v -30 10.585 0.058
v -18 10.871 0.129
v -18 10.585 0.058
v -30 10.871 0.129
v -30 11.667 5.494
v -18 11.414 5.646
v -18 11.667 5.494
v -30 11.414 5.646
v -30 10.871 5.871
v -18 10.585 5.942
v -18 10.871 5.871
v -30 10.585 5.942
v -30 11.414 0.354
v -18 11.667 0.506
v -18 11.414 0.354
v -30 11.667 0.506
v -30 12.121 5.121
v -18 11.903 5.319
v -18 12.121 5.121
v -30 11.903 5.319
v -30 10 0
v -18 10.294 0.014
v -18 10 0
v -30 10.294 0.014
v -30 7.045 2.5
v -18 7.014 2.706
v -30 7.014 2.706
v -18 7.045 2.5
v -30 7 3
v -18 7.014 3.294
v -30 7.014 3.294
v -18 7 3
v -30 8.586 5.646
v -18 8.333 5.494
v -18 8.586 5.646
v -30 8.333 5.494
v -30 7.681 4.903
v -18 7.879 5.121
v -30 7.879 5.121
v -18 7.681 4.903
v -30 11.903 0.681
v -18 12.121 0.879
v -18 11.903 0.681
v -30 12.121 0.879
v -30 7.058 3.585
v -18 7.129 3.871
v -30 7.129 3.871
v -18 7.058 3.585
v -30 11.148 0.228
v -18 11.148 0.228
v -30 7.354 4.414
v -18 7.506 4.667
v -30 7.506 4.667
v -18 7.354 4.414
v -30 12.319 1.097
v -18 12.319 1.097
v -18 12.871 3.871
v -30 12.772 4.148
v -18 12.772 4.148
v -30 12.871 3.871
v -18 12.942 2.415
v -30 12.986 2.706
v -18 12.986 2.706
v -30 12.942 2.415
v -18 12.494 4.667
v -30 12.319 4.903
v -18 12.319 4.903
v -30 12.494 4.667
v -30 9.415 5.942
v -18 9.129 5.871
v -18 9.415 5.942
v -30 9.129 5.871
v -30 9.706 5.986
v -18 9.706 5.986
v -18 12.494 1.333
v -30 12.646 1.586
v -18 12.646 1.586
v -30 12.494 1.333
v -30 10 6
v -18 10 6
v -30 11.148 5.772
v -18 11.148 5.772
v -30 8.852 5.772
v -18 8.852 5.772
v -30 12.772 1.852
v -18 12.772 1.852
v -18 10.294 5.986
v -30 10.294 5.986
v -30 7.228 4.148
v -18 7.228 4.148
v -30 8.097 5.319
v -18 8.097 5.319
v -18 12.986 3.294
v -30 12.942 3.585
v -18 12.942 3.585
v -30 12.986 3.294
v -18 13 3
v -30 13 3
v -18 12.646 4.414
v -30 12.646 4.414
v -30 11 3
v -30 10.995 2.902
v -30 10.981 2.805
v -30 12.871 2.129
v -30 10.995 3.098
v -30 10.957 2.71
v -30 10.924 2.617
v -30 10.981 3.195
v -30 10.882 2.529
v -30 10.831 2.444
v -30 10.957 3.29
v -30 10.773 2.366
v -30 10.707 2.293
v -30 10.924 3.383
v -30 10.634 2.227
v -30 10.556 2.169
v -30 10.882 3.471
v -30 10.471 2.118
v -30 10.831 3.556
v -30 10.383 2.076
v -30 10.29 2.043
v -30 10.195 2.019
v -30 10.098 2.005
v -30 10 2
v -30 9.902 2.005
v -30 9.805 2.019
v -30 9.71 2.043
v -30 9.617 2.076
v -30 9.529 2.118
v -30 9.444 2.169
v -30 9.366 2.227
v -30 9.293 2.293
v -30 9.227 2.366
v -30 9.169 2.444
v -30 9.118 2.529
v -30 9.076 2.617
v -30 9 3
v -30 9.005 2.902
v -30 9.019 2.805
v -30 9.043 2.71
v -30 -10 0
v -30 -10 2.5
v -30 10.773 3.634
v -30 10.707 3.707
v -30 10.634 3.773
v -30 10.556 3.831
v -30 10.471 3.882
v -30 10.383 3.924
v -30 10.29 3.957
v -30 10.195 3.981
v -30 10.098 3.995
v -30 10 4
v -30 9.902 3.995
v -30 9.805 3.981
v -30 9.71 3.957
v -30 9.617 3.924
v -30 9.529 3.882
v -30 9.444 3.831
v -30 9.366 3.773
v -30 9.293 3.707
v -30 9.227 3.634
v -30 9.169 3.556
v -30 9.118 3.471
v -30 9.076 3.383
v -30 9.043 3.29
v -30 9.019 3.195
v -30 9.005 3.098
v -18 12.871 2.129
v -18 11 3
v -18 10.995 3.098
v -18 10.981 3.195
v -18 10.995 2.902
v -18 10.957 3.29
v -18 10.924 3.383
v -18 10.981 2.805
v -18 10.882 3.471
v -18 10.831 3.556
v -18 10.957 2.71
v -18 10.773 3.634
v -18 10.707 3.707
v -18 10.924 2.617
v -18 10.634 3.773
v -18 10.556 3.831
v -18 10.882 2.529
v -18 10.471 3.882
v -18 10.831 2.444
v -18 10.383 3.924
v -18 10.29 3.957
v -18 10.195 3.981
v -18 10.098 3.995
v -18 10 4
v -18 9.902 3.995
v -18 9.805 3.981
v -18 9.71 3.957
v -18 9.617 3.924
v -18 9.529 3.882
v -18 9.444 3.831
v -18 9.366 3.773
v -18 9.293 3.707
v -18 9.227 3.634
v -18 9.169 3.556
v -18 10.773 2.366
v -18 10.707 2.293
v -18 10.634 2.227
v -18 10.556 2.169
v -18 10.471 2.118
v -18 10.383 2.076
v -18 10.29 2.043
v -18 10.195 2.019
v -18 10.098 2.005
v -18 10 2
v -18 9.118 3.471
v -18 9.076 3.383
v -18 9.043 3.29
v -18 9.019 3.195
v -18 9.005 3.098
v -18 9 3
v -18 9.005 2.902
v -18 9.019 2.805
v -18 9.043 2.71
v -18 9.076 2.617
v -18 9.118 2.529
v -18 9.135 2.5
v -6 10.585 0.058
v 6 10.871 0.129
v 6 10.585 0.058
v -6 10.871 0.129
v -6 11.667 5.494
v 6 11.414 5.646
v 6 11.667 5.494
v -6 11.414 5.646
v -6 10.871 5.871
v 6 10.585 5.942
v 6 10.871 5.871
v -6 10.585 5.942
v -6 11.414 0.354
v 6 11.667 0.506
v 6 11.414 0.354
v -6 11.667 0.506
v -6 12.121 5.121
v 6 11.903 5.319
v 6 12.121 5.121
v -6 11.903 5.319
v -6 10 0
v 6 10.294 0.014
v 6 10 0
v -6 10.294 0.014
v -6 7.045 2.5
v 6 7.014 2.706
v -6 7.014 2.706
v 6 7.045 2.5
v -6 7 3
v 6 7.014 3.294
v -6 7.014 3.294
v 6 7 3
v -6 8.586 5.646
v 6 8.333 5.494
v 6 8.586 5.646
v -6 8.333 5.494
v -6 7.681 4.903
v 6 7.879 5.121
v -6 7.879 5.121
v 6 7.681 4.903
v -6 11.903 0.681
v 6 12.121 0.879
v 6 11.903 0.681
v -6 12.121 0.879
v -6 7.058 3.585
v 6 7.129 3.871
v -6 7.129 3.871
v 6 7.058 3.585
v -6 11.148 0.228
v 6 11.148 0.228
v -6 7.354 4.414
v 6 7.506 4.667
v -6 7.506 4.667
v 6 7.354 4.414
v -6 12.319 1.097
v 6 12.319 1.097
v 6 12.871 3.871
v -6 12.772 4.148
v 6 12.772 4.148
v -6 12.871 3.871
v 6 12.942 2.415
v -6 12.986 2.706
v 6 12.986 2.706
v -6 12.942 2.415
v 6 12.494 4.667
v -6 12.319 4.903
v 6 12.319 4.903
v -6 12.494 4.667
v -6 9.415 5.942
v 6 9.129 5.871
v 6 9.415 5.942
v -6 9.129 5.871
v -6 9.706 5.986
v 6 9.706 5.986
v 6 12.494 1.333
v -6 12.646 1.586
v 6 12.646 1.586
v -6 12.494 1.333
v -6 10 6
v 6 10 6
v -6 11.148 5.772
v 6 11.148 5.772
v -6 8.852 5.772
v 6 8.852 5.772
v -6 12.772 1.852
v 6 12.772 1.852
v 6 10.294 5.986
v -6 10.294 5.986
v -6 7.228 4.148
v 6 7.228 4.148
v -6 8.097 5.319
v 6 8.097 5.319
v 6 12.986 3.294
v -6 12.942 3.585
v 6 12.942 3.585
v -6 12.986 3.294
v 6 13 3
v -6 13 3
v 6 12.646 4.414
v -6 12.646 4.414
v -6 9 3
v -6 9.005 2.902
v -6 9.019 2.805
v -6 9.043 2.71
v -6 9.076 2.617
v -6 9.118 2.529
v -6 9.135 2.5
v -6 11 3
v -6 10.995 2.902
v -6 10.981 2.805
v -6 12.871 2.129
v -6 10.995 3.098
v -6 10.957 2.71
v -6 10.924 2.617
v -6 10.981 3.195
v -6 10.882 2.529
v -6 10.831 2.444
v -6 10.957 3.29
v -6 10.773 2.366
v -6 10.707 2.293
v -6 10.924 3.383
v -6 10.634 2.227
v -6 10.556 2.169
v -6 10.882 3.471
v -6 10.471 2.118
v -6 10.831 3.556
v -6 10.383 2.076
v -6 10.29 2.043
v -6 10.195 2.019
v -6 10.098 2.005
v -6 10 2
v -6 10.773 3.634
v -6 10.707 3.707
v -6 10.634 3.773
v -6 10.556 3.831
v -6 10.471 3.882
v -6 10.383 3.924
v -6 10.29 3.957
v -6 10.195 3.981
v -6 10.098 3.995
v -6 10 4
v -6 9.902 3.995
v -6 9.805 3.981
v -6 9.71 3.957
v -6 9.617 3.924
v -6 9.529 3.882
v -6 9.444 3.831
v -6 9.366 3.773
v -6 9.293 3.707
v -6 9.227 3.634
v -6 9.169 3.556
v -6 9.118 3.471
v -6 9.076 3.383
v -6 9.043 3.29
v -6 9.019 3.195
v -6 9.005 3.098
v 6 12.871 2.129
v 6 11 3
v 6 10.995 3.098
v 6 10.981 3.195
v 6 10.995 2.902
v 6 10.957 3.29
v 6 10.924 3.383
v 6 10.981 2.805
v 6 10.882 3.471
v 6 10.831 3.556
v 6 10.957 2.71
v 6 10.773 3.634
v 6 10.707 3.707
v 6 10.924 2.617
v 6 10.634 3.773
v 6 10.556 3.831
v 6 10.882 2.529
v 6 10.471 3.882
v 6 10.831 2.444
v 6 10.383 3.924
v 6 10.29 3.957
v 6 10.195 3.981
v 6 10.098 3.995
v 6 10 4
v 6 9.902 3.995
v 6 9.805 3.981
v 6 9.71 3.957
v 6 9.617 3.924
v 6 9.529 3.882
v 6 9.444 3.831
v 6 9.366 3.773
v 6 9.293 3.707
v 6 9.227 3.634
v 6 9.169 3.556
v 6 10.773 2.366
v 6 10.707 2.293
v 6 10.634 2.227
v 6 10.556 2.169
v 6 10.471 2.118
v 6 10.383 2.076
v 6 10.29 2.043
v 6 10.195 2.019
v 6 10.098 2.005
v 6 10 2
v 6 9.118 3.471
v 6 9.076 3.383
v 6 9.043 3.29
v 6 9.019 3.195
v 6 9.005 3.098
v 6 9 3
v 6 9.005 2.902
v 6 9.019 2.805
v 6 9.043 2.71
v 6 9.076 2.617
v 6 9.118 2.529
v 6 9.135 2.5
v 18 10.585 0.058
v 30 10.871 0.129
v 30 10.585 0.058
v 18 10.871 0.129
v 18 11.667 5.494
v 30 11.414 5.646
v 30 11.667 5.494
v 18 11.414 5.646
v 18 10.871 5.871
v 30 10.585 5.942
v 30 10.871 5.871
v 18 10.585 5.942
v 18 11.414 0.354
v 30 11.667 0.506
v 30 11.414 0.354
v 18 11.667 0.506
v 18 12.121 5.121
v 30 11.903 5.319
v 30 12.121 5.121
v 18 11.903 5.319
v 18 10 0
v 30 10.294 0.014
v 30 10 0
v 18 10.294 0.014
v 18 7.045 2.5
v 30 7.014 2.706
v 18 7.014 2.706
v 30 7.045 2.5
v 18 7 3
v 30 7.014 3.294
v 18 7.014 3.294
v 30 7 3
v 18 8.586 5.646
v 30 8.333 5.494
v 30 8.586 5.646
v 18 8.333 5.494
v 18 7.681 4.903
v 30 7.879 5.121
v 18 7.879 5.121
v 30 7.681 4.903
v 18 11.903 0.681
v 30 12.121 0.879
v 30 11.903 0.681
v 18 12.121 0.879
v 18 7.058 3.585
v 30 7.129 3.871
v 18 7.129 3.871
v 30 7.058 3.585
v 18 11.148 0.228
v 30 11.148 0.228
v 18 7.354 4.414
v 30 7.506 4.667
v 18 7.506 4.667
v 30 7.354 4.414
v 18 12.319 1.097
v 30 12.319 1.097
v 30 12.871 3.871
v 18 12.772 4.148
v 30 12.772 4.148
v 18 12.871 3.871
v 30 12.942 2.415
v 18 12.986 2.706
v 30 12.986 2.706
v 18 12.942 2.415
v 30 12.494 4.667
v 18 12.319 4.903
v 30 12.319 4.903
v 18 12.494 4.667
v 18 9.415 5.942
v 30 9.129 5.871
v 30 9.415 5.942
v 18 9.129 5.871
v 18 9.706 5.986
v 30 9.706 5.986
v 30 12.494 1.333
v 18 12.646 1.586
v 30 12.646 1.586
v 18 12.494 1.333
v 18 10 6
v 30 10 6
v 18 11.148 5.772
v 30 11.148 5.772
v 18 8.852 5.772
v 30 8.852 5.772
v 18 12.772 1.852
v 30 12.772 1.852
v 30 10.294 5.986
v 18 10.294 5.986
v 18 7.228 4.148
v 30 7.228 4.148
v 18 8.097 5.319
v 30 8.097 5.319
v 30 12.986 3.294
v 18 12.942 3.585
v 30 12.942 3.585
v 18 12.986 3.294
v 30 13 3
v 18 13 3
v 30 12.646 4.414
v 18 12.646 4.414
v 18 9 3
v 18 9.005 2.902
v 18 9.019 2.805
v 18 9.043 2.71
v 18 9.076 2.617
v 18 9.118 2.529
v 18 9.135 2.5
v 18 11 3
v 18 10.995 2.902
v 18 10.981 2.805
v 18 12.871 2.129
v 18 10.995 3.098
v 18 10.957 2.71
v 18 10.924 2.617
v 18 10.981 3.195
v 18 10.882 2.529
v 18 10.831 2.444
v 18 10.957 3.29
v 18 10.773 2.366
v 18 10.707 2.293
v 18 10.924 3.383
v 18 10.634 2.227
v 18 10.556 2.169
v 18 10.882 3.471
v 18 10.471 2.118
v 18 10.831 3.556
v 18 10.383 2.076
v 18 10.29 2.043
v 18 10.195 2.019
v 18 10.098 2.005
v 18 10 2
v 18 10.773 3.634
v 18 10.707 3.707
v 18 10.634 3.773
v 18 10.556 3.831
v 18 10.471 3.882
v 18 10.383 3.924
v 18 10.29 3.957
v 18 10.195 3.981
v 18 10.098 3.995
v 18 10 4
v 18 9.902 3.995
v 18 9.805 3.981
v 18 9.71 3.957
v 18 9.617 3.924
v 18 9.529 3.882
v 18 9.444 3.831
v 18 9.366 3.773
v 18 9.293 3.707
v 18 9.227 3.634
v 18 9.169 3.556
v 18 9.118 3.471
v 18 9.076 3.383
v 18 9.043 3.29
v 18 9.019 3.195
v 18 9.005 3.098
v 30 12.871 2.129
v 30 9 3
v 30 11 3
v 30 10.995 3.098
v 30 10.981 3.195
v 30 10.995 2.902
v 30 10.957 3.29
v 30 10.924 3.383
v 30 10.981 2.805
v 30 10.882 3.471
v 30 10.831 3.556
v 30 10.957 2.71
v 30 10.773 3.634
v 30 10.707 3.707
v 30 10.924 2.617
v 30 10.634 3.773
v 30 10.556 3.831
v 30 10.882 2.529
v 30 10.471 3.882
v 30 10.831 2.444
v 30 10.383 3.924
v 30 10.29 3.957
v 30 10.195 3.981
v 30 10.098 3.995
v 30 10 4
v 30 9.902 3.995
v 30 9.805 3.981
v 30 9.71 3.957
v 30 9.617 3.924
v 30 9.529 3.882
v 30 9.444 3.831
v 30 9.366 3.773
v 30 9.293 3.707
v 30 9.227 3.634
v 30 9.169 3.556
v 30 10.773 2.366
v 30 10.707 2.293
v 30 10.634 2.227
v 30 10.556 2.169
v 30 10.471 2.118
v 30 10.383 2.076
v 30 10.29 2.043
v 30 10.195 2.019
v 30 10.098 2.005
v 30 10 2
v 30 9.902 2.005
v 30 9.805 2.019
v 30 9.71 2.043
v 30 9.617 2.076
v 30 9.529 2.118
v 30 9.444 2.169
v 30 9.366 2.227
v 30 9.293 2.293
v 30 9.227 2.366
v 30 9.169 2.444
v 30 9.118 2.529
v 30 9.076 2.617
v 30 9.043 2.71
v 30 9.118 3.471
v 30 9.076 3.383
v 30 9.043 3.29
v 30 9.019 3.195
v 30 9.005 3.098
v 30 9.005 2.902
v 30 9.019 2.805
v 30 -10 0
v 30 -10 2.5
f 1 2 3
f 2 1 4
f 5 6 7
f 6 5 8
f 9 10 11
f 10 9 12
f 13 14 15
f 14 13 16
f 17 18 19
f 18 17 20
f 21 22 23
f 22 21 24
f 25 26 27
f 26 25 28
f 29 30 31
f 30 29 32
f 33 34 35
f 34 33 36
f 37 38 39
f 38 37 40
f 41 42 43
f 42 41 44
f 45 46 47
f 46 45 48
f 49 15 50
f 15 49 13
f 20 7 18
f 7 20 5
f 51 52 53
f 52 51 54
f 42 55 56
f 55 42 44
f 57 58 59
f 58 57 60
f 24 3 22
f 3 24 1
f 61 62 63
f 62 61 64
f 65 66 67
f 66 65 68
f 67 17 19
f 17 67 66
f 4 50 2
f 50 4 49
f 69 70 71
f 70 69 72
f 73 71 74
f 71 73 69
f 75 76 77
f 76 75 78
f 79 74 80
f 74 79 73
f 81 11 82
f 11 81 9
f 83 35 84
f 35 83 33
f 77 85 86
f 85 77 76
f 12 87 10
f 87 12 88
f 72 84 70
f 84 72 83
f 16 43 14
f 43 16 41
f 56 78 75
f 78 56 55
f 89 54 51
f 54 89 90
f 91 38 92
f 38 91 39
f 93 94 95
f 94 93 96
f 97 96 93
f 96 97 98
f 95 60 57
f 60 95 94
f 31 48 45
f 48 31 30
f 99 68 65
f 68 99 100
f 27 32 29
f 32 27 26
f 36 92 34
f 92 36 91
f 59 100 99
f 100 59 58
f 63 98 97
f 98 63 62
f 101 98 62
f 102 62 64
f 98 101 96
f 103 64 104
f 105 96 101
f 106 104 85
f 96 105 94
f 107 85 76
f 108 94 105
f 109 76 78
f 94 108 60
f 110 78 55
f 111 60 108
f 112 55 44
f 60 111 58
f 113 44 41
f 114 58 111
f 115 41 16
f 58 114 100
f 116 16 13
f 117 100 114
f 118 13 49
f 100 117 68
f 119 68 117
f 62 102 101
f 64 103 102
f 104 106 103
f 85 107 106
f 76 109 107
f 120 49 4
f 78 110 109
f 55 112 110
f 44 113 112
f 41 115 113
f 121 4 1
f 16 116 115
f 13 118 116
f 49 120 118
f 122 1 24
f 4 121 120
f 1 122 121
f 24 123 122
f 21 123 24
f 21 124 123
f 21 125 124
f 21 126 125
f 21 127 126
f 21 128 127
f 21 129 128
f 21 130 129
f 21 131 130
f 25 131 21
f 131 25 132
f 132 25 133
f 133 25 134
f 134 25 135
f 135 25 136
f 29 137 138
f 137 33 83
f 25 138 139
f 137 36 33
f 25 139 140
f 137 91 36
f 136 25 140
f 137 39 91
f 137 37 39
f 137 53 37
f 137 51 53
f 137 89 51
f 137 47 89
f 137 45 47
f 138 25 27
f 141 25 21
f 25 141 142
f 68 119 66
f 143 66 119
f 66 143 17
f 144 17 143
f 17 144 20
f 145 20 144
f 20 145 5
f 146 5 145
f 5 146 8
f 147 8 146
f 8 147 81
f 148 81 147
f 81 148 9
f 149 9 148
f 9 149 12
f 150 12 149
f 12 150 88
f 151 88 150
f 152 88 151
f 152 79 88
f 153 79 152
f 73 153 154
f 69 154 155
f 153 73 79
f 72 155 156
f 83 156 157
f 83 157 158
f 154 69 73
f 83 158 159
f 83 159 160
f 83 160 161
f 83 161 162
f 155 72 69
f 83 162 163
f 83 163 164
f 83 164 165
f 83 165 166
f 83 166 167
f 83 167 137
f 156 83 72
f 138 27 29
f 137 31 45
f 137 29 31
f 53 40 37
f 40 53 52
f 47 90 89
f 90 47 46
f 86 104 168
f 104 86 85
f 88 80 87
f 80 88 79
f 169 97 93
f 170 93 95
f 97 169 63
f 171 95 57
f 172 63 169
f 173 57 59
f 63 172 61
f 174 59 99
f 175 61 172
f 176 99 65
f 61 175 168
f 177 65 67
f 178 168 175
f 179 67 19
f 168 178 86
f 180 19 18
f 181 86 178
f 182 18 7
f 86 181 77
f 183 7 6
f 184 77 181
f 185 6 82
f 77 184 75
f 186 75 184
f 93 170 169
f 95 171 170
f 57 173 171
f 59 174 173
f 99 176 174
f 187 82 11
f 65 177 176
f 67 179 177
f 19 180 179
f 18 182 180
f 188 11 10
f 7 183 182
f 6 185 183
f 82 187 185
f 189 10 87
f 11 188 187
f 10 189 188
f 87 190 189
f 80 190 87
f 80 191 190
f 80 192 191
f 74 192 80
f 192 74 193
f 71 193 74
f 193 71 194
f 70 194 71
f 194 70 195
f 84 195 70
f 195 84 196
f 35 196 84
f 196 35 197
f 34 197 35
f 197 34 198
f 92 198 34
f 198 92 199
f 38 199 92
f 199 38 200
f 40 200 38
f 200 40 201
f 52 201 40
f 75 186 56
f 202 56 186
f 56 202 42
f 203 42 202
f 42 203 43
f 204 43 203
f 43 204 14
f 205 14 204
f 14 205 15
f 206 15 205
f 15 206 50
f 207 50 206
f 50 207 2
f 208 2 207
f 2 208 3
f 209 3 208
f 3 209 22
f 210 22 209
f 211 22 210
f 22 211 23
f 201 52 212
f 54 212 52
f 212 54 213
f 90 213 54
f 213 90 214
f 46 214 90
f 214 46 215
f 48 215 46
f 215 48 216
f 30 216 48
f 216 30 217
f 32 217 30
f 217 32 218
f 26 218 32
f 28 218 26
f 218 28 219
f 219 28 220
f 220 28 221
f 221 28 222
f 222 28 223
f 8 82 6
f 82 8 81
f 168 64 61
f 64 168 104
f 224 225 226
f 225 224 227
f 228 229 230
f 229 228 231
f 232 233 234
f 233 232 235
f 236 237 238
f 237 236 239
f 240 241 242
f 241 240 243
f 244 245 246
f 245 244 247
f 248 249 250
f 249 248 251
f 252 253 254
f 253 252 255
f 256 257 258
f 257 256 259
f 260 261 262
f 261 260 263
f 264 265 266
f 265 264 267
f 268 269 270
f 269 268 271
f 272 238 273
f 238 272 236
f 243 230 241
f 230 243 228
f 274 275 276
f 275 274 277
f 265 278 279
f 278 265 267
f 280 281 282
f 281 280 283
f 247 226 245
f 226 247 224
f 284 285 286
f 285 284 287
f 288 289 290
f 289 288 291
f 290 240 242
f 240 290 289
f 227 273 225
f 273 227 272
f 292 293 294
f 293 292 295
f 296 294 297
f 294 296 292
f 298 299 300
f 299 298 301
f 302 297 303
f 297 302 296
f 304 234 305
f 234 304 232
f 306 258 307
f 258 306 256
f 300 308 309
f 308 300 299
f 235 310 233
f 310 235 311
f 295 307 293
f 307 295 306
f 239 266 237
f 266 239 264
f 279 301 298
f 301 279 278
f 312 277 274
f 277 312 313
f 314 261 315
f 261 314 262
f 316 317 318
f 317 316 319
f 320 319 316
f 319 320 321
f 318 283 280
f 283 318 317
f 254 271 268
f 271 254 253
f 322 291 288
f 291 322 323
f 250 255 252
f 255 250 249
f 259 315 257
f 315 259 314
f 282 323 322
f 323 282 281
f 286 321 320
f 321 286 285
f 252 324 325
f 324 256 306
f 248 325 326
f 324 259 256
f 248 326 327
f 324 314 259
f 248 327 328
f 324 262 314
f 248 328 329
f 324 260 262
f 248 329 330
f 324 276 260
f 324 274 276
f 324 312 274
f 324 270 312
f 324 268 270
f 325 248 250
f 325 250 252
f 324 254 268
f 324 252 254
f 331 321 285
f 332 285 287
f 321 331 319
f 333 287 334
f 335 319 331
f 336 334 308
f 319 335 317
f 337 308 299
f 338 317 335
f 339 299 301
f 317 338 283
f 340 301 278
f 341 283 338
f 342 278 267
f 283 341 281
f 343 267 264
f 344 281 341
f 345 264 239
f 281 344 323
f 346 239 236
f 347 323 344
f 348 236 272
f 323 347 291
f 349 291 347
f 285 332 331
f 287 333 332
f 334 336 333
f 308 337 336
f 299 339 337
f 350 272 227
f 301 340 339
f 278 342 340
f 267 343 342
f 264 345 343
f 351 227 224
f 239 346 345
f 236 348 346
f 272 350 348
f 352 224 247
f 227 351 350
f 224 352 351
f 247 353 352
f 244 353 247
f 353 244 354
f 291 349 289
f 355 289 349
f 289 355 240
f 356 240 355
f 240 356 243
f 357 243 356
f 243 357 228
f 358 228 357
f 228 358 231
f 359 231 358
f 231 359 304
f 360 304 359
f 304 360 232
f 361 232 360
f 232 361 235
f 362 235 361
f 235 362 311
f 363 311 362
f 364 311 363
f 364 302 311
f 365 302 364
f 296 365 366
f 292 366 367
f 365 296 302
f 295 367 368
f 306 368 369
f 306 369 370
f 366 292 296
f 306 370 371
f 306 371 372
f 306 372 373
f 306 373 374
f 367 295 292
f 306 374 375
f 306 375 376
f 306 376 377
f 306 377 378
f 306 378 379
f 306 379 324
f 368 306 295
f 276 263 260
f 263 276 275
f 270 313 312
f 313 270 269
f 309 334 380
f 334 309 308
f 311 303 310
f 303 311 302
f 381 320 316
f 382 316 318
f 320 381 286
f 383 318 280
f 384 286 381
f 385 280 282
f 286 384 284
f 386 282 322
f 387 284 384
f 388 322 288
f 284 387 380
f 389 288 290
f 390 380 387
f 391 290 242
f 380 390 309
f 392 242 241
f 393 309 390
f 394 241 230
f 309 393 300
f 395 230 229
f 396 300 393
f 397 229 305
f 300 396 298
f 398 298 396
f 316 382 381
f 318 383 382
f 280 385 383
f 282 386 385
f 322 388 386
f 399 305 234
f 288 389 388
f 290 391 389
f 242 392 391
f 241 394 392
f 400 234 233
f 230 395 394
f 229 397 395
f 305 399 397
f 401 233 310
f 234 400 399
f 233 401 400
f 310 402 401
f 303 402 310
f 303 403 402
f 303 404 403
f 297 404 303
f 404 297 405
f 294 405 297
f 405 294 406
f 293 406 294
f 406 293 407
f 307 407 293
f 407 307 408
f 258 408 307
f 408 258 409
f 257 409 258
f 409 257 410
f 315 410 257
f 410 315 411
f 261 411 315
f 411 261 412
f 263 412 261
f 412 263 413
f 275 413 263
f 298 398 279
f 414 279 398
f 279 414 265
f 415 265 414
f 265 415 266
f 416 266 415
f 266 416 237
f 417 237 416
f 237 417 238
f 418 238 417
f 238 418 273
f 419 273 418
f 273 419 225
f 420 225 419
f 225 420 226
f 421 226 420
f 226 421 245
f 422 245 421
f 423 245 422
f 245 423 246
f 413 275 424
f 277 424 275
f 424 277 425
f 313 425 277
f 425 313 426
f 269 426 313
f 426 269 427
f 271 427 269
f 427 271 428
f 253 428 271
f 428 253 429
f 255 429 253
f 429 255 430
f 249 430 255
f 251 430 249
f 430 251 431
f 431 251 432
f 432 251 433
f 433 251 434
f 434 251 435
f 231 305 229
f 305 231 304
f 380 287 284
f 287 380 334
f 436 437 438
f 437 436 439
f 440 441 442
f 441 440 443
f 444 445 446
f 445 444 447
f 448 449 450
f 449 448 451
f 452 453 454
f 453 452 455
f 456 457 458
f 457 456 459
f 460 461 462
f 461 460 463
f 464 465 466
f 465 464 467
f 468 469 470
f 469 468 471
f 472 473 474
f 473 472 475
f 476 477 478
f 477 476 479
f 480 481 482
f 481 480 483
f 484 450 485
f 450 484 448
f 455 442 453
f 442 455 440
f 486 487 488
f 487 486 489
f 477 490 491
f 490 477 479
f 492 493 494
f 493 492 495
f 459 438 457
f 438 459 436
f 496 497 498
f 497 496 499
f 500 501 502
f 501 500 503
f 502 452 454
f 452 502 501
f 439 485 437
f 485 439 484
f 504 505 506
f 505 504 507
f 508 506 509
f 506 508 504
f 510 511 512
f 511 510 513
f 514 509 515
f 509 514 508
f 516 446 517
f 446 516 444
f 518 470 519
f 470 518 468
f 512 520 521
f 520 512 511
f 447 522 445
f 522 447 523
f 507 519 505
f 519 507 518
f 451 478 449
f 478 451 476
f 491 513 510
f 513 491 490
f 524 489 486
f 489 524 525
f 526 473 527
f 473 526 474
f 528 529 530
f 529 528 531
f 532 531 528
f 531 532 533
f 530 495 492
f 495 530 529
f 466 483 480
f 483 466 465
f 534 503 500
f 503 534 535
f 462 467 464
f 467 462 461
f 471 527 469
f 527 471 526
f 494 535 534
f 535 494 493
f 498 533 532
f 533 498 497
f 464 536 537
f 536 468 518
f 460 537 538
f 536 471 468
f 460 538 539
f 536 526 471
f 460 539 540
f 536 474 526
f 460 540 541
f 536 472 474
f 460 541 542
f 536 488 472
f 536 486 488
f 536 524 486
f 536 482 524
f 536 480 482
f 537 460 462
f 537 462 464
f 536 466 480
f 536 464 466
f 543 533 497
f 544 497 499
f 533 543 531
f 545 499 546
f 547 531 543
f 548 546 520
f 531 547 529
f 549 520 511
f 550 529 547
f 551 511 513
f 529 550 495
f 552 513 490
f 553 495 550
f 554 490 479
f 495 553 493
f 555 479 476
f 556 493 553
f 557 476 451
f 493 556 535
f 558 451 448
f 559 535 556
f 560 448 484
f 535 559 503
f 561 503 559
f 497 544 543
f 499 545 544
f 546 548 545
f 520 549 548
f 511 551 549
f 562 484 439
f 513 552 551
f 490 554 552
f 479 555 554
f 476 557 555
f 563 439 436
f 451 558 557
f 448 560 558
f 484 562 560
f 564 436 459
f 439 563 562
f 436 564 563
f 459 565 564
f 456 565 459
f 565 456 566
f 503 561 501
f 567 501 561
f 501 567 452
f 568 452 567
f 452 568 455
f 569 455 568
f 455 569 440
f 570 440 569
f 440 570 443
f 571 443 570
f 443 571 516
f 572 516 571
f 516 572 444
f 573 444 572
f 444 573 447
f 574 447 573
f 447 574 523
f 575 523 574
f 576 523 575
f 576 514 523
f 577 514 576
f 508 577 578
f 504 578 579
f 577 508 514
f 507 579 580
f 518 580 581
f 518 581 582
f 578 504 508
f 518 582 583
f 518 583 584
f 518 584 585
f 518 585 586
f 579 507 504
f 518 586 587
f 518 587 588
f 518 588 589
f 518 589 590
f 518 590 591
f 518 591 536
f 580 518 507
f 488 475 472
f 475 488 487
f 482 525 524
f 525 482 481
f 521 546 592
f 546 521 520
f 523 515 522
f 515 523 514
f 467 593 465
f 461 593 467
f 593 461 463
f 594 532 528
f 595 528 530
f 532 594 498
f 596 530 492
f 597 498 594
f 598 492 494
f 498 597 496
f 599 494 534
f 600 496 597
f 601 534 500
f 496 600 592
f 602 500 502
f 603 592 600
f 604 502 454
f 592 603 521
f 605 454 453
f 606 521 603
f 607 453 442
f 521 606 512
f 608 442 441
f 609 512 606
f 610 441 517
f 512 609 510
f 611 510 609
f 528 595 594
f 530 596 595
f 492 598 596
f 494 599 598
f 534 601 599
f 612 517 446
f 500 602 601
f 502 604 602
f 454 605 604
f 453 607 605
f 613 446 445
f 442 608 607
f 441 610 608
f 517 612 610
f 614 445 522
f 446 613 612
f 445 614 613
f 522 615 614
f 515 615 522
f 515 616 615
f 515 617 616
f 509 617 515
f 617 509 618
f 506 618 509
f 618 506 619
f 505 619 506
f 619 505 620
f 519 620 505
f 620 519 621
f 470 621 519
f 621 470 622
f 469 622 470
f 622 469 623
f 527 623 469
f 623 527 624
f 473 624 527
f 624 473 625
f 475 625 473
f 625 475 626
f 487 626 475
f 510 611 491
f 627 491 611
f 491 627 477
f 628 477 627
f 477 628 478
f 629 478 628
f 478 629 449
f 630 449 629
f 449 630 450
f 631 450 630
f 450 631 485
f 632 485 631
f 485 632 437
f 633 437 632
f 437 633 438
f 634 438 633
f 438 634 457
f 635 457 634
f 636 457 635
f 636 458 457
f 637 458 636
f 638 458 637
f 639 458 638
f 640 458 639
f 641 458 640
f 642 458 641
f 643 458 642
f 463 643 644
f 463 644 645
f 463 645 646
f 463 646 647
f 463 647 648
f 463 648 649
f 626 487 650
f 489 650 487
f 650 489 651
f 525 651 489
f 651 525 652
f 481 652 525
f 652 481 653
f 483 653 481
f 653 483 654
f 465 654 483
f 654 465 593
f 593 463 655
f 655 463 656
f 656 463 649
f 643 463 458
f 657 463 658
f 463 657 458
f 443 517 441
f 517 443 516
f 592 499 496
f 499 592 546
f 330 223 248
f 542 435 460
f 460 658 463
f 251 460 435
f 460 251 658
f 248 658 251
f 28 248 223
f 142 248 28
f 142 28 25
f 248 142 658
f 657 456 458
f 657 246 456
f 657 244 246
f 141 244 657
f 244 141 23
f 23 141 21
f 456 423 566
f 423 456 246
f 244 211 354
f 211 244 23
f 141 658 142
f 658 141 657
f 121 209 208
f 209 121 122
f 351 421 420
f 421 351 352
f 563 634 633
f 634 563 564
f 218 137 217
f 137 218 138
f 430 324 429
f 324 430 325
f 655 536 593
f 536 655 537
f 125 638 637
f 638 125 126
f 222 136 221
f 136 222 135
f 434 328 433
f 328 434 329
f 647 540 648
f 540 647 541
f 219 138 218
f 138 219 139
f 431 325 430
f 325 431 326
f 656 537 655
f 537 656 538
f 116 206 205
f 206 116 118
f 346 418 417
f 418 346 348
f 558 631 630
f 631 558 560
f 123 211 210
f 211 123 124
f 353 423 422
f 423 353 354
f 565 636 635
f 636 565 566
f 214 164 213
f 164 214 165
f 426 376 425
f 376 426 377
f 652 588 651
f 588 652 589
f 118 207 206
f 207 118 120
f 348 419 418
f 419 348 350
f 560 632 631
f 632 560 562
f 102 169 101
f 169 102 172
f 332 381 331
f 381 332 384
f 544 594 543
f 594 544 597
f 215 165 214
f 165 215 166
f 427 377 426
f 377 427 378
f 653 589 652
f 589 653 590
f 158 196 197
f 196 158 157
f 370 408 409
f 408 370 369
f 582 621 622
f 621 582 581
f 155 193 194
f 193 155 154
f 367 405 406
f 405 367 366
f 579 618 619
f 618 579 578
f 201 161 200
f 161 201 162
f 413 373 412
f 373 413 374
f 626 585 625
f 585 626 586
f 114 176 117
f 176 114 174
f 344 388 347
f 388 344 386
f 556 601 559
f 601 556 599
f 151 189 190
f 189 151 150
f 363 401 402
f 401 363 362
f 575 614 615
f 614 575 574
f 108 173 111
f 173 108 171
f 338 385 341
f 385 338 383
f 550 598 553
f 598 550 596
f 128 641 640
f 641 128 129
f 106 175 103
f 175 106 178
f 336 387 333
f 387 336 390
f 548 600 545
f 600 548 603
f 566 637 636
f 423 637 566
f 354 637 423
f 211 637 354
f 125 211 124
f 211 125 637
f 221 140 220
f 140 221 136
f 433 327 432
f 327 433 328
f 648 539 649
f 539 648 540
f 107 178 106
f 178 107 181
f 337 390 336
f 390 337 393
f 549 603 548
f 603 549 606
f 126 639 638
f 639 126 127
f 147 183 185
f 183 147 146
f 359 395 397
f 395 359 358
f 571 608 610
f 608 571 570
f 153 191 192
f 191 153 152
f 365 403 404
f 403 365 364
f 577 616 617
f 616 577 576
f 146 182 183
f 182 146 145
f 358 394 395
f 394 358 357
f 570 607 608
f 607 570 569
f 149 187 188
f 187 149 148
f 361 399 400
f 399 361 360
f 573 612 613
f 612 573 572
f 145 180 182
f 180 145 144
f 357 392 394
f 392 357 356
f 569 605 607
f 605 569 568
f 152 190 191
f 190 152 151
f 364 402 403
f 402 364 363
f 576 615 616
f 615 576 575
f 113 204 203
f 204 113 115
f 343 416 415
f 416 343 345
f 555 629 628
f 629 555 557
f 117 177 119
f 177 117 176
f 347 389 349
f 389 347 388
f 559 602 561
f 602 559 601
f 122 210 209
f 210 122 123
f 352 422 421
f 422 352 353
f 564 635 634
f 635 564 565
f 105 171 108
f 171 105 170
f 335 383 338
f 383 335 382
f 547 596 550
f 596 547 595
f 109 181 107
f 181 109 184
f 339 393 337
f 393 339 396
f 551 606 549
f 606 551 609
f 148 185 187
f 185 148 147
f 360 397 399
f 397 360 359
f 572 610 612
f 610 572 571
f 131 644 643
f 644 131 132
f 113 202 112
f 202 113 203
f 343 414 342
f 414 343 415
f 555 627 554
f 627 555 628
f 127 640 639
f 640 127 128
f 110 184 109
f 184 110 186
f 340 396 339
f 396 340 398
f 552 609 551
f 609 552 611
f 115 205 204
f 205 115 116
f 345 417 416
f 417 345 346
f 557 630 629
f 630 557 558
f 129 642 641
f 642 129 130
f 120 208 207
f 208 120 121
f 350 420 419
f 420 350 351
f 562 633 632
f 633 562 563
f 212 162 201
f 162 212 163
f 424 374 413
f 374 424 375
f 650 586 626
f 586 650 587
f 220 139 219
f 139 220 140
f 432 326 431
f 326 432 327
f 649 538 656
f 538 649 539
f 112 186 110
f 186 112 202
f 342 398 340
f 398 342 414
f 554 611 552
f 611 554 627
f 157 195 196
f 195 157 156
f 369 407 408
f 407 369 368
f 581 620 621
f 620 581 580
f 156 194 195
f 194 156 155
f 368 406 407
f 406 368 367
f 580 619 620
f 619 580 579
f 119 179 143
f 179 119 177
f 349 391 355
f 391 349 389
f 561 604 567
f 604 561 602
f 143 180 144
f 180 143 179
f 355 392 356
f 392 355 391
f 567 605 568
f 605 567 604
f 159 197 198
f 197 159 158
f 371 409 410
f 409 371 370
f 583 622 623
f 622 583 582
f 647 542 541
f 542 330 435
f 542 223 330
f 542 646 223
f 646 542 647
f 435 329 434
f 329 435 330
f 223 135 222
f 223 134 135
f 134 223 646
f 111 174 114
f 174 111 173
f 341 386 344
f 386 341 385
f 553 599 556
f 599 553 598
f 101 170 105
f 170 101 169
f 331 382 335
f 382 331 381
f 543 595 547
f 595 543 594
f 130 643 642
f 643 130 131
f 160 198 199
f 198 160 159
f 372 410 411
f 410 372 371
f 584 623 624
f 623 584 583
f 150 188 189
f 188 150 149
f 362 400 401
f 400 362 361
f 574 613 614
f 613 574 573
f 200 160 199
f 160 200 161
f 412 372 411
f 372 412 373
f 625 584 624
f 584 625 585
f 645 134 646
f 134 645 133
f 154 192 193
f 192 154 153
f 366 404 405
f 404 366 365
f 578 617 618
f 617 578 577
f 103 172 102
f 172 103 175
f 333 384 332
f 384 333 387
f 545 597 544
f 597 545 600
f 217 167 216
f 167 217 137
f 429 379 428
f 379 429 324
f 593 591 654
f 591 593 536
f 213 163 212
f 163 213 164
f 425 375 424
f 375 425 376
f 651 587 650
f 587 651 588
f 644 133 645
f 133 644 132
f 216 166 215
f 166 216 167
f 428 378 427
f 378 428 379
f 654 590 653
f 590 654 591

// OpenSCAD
// Pin hinge leaf - one half of a pin hinge
// Print orientation: plate flat on the bed (z = 0), knuckles up along +Y edge

$fn = 64;

// ---------- Plate ----------
plate_len   = 60;    // plate length along X (mm)
plate_wid   = 20;    // plate width along Y (mm)
plate_thk   = 2.5;   // plate thickness along Z (mm)

// ---------- Knuckles ----------
n_segments  = 5;                       // number of equal segments along the edge
seg_len     = plate_len / n_segments;  // segment length = 12 mm
knuckle_d   = 6;     // knuckle outer diameter (mm)
axis_y      = 10;    // knuckle axis Y position (mm)
axis_z      = 3;     // knuckle axis Z position (mm)

// ---------- Pin hole ----------
pin_d       = 2;     // pin hole diameter (mm)
eps         = 0.5;   // overshoot for clean boolean cuts (mm)

difference() {
    union() {
        // Flat plate, centred on origin in X and Y
        translate([-plate_len/2, -plate_wid/2, 0])
            cube([plate_len, plate_wid, plate_thk]);

        // Knuckles on 1st, 3rd and 5th segments (indices 0, 2, 4)
        for (i = [0 : 2 : n_segments - 1])
            translate([-plate_len/2 + i*seg_len, axis_y, axis_z])
                rotate([0, 90, 0])
                    cylinder(d = knuckle_d, h = seg_len);
    }

    // Pin hole along the common knuckle axis, through every knuckle
    translate([-plate_len/2 - eps, axis_y, axis_z])
        rotate([0, 90, 0])
            cylinder(d = pin_d, h = plate_len + 2*eps);
}
